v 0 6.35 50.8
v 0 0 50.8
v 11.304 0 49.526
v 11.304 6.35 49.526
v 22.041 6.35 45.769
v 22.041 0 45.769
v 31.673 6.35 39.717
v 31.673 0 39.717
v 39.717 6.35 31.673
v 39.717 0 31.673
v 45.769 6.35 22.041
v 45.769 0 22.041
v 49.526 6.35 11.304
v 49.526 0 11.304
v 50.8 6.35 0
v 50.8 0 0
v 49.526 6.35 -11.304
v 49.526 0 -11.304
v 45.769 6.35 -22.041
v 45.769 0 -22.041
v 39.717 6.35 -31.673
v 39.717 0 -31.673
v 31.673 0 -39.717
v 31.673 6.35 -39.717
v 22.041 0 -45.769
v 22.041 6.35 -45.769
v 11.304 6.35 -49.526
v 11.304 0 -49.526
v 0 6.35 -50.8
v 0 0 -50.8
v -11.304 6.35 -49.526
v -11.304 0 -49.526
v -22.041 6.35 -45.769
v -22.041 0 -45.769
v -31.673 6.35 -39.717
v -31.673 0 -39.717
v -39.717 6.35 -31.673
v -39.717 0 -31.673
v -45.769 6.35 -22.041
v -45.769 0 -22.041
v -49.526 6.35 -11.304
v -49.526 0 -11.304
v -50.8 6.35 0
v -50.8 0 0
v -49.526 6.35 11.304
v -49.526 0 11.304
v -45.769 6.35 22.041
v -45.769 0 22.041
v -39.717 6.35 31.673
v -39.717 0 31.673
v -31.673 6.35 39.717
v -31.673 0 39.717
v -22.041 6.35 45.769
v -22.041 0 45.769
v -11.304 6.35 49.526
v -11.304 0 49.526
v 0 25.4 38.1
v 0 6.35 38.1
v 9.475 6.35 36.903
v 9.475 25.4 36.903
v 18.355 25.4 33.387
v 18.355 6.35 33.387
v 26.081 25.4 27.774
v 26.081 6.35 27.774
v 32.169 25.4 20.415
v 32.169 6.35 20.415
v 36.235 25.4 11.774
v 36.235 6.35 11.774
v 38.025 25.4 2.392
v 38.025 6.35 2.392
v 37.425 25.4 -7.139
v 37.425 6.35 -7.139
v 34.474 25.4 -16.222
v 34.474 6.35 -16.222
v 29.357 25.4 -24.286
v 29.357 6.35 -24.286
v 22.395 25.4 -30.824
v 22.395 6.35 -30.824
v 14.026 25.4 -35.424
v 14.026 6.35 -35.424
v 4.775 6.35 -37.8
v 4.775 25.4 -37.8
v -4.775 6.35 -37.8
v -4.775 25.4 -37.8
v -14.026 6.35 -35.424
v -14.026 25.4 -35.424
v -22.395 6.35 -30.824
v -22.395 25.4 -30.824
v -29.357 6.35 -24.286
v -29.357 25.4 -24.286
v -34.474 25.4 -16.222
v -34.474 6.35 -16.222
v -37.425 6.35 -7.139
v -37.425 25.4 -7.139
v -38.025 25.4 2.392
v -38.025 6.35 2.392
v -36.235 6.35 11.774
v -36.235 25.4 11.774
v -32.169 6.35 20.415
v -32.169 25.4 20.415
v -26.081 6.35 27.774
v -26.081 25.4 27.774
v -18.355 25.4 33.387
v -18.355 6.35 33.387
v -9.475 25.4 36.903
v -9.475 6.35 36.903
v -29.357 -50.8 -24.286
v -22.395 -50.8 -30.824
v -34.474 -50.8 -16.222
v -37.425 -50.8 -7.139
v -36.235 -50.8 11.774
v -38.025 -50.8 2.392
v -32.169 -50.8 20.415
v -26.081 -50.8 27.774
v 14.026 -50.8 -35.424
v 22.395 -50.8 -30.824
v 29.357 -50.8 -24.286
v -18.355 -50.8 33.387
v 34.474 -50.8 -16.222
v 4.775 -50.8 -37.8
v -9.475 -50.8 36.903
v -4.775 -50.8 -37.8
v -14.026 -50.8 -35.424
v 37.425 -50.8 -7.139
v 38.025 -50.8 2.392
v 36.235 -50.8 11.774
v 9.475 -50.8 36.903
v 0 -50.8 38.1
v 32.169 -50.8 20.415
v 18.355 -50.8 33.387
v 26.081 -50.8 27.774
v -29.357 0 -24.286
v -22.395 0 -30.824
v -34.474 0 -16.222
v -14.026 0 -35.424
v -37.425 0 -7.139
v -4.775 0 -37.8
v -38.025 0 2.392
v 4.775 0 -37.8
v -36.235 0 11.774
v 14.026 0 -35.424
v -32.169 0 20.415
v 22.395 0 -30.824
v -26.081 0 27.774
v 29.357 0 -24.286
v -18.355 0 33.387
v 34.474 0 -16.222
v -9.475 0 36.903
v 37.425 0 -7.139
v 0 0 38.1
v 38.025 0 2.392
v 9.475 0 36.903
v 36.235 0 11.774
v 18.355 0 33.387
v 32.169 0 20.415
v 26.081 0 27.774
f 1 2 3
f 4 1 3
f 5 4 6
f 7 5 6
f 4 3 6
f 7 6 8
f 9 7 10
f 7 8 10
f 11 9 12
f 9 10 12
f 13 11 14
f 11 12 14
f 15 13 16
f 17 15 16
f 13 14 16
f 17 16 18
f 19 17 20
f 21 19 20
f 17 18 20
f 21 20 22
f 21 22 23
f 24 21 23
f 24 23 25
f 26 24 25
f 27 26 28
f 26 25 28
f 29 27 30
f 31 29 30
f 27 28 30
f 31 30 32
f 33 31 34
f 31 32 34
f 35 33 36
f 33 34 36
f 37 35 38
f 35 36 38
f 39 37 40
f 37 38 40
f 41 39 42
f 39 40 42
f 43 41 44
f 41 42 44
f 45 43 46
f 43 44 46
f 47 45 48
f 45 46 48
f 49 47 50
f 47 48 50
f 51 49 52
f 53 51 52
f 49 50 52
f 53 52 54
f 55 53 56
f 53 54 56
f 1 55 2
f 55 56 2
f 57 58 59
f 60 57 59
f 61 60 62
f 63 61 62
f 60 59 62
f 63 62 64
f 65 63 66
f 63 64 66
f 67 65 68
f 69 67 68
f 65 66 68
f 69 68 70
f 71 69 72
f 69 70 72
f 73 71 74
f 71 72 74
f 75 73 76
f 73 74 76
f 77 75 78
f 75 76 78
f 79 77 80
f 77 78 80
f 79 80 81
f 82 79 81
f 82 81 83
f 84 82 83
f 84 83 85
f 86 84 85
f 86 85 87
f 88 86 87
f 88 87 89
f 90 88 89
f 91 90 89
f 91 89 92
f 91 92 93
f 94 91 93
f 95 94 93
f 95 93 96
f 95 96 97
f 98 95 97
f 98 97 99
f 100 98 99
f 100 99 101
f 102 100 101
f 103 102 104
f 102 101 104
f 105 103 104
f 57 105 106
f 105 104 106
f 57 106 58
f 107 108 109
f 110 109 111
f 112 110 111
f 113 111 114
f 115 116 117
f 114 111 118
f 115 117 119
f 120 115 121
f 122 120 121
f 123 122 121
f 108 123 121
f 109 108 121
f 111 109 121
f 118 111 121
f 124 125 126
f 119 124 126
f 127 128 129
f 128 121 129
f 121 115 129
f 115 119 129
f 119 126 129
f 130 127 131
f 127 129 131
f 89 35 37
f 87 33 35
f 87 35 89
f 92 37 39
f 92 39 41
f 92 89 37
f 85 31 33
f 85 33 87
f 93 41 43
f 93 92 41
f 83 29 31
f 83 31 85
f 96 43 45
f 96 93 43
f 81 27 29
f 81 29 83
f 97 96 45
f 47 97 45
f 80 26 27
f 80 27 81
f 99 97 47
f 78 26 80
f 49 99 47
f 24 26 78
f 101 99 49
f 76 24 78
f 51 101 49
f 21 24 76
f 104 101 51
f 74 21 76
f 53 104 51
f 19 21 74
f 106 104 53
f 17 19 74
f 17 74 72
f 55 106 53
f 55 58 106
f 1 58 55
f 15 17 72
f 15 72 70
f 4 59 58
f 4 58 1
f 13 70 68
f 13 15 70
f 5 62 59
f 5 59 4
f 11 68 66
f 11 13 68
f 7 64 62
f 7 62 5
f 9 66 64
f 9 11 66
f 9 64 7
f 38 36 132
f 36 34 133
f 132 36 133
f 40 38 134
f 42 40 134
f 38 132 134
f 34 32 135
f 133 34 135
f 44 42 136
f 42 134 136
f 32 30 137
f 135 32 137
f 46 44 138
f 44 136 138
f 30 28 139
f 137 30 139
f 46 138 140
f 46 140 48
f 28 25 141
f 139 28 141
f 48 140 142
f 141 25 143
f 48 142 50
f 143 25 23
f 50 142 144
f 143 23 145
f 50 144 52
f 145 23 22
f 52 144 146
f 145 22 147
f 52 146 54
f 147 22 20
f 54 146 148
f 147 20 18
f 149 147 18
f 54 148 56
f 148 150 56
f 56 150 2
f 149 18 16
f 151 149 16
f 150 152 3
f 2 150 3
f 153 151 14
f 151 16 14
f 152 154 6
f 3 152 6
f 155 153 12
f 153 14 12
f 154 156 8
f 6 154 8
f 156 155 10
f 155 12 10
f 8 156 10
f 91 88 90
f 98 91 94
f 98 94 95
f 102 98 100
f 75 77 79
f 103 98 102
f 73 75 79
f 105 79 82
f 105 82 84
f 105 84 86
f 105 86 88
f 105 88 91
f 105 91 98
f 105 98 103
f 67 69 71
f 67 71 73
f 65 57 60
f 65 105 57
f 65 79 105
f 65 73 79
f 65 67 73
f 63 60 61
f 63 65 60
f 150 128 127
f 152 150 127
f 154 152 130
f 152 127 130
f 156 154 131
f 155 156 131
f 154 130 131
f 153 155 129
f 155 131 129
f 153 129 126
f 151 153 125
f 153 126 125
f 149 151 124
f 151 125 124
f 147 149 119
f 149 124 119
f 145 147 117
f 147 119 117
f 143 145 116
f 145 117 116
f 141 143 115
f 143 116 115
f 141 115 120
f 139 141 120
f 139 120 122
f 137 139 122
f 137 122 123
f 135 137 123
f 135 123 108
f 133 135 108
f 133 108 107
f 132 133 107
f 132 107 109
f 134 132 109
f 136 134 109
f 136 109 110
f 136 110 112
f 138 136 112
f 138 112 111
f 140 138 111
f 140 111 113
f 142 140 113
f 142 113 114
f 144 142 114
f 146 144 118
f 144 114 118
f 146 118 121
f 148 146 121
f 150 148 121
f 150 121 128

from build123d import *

# Parameters (mm, degrees)
BOSS_EXTRUDE1_DEPTH      = 25.4
BOSS_EXTRUDE1_DEPTH_BACK = 50.8
SKETCH1_R                = 38.1
SKETCH1_3_R              = 50.8
SKETCH1_3_R_2            = 38.1
BOSS_EXTRUDE2_DEPTH      = 6.35


with BuildPart() as part:
    # Sketch1 → Boss-Extrude1 (new, two sides: drawn at the far end of the back side and taken through both)
    with BuildSketch(Plane(origin=(0, 0, 0), x_dir=(1, 0, 0), z_dir=(0, 1, 0)).offset(-BOSS_EXTRUDE1_DEPTH_BACK)):
        Circle(SKETCH1_R)
    extrude(amount=BOSS_EXTRUDE1_DEPTH + BOSS_EXTRUDE1_DEPTH_BACK)

    # Sketch1<3> → Boss-Extrude2 (add)
    with BuildSketch(Plane(origin=(0, 0, 0), x_dir=(1, 0, 0), z_dir=(0, 1, 0))):
        Circle(SKETCH1_3_R)
        Circle(SKETCH1_3_R_2, mode=Mode.SUBTRACT)
    extrude(amount=BOSS_EXTRUDE2_DEPTH)


solid = part.part
